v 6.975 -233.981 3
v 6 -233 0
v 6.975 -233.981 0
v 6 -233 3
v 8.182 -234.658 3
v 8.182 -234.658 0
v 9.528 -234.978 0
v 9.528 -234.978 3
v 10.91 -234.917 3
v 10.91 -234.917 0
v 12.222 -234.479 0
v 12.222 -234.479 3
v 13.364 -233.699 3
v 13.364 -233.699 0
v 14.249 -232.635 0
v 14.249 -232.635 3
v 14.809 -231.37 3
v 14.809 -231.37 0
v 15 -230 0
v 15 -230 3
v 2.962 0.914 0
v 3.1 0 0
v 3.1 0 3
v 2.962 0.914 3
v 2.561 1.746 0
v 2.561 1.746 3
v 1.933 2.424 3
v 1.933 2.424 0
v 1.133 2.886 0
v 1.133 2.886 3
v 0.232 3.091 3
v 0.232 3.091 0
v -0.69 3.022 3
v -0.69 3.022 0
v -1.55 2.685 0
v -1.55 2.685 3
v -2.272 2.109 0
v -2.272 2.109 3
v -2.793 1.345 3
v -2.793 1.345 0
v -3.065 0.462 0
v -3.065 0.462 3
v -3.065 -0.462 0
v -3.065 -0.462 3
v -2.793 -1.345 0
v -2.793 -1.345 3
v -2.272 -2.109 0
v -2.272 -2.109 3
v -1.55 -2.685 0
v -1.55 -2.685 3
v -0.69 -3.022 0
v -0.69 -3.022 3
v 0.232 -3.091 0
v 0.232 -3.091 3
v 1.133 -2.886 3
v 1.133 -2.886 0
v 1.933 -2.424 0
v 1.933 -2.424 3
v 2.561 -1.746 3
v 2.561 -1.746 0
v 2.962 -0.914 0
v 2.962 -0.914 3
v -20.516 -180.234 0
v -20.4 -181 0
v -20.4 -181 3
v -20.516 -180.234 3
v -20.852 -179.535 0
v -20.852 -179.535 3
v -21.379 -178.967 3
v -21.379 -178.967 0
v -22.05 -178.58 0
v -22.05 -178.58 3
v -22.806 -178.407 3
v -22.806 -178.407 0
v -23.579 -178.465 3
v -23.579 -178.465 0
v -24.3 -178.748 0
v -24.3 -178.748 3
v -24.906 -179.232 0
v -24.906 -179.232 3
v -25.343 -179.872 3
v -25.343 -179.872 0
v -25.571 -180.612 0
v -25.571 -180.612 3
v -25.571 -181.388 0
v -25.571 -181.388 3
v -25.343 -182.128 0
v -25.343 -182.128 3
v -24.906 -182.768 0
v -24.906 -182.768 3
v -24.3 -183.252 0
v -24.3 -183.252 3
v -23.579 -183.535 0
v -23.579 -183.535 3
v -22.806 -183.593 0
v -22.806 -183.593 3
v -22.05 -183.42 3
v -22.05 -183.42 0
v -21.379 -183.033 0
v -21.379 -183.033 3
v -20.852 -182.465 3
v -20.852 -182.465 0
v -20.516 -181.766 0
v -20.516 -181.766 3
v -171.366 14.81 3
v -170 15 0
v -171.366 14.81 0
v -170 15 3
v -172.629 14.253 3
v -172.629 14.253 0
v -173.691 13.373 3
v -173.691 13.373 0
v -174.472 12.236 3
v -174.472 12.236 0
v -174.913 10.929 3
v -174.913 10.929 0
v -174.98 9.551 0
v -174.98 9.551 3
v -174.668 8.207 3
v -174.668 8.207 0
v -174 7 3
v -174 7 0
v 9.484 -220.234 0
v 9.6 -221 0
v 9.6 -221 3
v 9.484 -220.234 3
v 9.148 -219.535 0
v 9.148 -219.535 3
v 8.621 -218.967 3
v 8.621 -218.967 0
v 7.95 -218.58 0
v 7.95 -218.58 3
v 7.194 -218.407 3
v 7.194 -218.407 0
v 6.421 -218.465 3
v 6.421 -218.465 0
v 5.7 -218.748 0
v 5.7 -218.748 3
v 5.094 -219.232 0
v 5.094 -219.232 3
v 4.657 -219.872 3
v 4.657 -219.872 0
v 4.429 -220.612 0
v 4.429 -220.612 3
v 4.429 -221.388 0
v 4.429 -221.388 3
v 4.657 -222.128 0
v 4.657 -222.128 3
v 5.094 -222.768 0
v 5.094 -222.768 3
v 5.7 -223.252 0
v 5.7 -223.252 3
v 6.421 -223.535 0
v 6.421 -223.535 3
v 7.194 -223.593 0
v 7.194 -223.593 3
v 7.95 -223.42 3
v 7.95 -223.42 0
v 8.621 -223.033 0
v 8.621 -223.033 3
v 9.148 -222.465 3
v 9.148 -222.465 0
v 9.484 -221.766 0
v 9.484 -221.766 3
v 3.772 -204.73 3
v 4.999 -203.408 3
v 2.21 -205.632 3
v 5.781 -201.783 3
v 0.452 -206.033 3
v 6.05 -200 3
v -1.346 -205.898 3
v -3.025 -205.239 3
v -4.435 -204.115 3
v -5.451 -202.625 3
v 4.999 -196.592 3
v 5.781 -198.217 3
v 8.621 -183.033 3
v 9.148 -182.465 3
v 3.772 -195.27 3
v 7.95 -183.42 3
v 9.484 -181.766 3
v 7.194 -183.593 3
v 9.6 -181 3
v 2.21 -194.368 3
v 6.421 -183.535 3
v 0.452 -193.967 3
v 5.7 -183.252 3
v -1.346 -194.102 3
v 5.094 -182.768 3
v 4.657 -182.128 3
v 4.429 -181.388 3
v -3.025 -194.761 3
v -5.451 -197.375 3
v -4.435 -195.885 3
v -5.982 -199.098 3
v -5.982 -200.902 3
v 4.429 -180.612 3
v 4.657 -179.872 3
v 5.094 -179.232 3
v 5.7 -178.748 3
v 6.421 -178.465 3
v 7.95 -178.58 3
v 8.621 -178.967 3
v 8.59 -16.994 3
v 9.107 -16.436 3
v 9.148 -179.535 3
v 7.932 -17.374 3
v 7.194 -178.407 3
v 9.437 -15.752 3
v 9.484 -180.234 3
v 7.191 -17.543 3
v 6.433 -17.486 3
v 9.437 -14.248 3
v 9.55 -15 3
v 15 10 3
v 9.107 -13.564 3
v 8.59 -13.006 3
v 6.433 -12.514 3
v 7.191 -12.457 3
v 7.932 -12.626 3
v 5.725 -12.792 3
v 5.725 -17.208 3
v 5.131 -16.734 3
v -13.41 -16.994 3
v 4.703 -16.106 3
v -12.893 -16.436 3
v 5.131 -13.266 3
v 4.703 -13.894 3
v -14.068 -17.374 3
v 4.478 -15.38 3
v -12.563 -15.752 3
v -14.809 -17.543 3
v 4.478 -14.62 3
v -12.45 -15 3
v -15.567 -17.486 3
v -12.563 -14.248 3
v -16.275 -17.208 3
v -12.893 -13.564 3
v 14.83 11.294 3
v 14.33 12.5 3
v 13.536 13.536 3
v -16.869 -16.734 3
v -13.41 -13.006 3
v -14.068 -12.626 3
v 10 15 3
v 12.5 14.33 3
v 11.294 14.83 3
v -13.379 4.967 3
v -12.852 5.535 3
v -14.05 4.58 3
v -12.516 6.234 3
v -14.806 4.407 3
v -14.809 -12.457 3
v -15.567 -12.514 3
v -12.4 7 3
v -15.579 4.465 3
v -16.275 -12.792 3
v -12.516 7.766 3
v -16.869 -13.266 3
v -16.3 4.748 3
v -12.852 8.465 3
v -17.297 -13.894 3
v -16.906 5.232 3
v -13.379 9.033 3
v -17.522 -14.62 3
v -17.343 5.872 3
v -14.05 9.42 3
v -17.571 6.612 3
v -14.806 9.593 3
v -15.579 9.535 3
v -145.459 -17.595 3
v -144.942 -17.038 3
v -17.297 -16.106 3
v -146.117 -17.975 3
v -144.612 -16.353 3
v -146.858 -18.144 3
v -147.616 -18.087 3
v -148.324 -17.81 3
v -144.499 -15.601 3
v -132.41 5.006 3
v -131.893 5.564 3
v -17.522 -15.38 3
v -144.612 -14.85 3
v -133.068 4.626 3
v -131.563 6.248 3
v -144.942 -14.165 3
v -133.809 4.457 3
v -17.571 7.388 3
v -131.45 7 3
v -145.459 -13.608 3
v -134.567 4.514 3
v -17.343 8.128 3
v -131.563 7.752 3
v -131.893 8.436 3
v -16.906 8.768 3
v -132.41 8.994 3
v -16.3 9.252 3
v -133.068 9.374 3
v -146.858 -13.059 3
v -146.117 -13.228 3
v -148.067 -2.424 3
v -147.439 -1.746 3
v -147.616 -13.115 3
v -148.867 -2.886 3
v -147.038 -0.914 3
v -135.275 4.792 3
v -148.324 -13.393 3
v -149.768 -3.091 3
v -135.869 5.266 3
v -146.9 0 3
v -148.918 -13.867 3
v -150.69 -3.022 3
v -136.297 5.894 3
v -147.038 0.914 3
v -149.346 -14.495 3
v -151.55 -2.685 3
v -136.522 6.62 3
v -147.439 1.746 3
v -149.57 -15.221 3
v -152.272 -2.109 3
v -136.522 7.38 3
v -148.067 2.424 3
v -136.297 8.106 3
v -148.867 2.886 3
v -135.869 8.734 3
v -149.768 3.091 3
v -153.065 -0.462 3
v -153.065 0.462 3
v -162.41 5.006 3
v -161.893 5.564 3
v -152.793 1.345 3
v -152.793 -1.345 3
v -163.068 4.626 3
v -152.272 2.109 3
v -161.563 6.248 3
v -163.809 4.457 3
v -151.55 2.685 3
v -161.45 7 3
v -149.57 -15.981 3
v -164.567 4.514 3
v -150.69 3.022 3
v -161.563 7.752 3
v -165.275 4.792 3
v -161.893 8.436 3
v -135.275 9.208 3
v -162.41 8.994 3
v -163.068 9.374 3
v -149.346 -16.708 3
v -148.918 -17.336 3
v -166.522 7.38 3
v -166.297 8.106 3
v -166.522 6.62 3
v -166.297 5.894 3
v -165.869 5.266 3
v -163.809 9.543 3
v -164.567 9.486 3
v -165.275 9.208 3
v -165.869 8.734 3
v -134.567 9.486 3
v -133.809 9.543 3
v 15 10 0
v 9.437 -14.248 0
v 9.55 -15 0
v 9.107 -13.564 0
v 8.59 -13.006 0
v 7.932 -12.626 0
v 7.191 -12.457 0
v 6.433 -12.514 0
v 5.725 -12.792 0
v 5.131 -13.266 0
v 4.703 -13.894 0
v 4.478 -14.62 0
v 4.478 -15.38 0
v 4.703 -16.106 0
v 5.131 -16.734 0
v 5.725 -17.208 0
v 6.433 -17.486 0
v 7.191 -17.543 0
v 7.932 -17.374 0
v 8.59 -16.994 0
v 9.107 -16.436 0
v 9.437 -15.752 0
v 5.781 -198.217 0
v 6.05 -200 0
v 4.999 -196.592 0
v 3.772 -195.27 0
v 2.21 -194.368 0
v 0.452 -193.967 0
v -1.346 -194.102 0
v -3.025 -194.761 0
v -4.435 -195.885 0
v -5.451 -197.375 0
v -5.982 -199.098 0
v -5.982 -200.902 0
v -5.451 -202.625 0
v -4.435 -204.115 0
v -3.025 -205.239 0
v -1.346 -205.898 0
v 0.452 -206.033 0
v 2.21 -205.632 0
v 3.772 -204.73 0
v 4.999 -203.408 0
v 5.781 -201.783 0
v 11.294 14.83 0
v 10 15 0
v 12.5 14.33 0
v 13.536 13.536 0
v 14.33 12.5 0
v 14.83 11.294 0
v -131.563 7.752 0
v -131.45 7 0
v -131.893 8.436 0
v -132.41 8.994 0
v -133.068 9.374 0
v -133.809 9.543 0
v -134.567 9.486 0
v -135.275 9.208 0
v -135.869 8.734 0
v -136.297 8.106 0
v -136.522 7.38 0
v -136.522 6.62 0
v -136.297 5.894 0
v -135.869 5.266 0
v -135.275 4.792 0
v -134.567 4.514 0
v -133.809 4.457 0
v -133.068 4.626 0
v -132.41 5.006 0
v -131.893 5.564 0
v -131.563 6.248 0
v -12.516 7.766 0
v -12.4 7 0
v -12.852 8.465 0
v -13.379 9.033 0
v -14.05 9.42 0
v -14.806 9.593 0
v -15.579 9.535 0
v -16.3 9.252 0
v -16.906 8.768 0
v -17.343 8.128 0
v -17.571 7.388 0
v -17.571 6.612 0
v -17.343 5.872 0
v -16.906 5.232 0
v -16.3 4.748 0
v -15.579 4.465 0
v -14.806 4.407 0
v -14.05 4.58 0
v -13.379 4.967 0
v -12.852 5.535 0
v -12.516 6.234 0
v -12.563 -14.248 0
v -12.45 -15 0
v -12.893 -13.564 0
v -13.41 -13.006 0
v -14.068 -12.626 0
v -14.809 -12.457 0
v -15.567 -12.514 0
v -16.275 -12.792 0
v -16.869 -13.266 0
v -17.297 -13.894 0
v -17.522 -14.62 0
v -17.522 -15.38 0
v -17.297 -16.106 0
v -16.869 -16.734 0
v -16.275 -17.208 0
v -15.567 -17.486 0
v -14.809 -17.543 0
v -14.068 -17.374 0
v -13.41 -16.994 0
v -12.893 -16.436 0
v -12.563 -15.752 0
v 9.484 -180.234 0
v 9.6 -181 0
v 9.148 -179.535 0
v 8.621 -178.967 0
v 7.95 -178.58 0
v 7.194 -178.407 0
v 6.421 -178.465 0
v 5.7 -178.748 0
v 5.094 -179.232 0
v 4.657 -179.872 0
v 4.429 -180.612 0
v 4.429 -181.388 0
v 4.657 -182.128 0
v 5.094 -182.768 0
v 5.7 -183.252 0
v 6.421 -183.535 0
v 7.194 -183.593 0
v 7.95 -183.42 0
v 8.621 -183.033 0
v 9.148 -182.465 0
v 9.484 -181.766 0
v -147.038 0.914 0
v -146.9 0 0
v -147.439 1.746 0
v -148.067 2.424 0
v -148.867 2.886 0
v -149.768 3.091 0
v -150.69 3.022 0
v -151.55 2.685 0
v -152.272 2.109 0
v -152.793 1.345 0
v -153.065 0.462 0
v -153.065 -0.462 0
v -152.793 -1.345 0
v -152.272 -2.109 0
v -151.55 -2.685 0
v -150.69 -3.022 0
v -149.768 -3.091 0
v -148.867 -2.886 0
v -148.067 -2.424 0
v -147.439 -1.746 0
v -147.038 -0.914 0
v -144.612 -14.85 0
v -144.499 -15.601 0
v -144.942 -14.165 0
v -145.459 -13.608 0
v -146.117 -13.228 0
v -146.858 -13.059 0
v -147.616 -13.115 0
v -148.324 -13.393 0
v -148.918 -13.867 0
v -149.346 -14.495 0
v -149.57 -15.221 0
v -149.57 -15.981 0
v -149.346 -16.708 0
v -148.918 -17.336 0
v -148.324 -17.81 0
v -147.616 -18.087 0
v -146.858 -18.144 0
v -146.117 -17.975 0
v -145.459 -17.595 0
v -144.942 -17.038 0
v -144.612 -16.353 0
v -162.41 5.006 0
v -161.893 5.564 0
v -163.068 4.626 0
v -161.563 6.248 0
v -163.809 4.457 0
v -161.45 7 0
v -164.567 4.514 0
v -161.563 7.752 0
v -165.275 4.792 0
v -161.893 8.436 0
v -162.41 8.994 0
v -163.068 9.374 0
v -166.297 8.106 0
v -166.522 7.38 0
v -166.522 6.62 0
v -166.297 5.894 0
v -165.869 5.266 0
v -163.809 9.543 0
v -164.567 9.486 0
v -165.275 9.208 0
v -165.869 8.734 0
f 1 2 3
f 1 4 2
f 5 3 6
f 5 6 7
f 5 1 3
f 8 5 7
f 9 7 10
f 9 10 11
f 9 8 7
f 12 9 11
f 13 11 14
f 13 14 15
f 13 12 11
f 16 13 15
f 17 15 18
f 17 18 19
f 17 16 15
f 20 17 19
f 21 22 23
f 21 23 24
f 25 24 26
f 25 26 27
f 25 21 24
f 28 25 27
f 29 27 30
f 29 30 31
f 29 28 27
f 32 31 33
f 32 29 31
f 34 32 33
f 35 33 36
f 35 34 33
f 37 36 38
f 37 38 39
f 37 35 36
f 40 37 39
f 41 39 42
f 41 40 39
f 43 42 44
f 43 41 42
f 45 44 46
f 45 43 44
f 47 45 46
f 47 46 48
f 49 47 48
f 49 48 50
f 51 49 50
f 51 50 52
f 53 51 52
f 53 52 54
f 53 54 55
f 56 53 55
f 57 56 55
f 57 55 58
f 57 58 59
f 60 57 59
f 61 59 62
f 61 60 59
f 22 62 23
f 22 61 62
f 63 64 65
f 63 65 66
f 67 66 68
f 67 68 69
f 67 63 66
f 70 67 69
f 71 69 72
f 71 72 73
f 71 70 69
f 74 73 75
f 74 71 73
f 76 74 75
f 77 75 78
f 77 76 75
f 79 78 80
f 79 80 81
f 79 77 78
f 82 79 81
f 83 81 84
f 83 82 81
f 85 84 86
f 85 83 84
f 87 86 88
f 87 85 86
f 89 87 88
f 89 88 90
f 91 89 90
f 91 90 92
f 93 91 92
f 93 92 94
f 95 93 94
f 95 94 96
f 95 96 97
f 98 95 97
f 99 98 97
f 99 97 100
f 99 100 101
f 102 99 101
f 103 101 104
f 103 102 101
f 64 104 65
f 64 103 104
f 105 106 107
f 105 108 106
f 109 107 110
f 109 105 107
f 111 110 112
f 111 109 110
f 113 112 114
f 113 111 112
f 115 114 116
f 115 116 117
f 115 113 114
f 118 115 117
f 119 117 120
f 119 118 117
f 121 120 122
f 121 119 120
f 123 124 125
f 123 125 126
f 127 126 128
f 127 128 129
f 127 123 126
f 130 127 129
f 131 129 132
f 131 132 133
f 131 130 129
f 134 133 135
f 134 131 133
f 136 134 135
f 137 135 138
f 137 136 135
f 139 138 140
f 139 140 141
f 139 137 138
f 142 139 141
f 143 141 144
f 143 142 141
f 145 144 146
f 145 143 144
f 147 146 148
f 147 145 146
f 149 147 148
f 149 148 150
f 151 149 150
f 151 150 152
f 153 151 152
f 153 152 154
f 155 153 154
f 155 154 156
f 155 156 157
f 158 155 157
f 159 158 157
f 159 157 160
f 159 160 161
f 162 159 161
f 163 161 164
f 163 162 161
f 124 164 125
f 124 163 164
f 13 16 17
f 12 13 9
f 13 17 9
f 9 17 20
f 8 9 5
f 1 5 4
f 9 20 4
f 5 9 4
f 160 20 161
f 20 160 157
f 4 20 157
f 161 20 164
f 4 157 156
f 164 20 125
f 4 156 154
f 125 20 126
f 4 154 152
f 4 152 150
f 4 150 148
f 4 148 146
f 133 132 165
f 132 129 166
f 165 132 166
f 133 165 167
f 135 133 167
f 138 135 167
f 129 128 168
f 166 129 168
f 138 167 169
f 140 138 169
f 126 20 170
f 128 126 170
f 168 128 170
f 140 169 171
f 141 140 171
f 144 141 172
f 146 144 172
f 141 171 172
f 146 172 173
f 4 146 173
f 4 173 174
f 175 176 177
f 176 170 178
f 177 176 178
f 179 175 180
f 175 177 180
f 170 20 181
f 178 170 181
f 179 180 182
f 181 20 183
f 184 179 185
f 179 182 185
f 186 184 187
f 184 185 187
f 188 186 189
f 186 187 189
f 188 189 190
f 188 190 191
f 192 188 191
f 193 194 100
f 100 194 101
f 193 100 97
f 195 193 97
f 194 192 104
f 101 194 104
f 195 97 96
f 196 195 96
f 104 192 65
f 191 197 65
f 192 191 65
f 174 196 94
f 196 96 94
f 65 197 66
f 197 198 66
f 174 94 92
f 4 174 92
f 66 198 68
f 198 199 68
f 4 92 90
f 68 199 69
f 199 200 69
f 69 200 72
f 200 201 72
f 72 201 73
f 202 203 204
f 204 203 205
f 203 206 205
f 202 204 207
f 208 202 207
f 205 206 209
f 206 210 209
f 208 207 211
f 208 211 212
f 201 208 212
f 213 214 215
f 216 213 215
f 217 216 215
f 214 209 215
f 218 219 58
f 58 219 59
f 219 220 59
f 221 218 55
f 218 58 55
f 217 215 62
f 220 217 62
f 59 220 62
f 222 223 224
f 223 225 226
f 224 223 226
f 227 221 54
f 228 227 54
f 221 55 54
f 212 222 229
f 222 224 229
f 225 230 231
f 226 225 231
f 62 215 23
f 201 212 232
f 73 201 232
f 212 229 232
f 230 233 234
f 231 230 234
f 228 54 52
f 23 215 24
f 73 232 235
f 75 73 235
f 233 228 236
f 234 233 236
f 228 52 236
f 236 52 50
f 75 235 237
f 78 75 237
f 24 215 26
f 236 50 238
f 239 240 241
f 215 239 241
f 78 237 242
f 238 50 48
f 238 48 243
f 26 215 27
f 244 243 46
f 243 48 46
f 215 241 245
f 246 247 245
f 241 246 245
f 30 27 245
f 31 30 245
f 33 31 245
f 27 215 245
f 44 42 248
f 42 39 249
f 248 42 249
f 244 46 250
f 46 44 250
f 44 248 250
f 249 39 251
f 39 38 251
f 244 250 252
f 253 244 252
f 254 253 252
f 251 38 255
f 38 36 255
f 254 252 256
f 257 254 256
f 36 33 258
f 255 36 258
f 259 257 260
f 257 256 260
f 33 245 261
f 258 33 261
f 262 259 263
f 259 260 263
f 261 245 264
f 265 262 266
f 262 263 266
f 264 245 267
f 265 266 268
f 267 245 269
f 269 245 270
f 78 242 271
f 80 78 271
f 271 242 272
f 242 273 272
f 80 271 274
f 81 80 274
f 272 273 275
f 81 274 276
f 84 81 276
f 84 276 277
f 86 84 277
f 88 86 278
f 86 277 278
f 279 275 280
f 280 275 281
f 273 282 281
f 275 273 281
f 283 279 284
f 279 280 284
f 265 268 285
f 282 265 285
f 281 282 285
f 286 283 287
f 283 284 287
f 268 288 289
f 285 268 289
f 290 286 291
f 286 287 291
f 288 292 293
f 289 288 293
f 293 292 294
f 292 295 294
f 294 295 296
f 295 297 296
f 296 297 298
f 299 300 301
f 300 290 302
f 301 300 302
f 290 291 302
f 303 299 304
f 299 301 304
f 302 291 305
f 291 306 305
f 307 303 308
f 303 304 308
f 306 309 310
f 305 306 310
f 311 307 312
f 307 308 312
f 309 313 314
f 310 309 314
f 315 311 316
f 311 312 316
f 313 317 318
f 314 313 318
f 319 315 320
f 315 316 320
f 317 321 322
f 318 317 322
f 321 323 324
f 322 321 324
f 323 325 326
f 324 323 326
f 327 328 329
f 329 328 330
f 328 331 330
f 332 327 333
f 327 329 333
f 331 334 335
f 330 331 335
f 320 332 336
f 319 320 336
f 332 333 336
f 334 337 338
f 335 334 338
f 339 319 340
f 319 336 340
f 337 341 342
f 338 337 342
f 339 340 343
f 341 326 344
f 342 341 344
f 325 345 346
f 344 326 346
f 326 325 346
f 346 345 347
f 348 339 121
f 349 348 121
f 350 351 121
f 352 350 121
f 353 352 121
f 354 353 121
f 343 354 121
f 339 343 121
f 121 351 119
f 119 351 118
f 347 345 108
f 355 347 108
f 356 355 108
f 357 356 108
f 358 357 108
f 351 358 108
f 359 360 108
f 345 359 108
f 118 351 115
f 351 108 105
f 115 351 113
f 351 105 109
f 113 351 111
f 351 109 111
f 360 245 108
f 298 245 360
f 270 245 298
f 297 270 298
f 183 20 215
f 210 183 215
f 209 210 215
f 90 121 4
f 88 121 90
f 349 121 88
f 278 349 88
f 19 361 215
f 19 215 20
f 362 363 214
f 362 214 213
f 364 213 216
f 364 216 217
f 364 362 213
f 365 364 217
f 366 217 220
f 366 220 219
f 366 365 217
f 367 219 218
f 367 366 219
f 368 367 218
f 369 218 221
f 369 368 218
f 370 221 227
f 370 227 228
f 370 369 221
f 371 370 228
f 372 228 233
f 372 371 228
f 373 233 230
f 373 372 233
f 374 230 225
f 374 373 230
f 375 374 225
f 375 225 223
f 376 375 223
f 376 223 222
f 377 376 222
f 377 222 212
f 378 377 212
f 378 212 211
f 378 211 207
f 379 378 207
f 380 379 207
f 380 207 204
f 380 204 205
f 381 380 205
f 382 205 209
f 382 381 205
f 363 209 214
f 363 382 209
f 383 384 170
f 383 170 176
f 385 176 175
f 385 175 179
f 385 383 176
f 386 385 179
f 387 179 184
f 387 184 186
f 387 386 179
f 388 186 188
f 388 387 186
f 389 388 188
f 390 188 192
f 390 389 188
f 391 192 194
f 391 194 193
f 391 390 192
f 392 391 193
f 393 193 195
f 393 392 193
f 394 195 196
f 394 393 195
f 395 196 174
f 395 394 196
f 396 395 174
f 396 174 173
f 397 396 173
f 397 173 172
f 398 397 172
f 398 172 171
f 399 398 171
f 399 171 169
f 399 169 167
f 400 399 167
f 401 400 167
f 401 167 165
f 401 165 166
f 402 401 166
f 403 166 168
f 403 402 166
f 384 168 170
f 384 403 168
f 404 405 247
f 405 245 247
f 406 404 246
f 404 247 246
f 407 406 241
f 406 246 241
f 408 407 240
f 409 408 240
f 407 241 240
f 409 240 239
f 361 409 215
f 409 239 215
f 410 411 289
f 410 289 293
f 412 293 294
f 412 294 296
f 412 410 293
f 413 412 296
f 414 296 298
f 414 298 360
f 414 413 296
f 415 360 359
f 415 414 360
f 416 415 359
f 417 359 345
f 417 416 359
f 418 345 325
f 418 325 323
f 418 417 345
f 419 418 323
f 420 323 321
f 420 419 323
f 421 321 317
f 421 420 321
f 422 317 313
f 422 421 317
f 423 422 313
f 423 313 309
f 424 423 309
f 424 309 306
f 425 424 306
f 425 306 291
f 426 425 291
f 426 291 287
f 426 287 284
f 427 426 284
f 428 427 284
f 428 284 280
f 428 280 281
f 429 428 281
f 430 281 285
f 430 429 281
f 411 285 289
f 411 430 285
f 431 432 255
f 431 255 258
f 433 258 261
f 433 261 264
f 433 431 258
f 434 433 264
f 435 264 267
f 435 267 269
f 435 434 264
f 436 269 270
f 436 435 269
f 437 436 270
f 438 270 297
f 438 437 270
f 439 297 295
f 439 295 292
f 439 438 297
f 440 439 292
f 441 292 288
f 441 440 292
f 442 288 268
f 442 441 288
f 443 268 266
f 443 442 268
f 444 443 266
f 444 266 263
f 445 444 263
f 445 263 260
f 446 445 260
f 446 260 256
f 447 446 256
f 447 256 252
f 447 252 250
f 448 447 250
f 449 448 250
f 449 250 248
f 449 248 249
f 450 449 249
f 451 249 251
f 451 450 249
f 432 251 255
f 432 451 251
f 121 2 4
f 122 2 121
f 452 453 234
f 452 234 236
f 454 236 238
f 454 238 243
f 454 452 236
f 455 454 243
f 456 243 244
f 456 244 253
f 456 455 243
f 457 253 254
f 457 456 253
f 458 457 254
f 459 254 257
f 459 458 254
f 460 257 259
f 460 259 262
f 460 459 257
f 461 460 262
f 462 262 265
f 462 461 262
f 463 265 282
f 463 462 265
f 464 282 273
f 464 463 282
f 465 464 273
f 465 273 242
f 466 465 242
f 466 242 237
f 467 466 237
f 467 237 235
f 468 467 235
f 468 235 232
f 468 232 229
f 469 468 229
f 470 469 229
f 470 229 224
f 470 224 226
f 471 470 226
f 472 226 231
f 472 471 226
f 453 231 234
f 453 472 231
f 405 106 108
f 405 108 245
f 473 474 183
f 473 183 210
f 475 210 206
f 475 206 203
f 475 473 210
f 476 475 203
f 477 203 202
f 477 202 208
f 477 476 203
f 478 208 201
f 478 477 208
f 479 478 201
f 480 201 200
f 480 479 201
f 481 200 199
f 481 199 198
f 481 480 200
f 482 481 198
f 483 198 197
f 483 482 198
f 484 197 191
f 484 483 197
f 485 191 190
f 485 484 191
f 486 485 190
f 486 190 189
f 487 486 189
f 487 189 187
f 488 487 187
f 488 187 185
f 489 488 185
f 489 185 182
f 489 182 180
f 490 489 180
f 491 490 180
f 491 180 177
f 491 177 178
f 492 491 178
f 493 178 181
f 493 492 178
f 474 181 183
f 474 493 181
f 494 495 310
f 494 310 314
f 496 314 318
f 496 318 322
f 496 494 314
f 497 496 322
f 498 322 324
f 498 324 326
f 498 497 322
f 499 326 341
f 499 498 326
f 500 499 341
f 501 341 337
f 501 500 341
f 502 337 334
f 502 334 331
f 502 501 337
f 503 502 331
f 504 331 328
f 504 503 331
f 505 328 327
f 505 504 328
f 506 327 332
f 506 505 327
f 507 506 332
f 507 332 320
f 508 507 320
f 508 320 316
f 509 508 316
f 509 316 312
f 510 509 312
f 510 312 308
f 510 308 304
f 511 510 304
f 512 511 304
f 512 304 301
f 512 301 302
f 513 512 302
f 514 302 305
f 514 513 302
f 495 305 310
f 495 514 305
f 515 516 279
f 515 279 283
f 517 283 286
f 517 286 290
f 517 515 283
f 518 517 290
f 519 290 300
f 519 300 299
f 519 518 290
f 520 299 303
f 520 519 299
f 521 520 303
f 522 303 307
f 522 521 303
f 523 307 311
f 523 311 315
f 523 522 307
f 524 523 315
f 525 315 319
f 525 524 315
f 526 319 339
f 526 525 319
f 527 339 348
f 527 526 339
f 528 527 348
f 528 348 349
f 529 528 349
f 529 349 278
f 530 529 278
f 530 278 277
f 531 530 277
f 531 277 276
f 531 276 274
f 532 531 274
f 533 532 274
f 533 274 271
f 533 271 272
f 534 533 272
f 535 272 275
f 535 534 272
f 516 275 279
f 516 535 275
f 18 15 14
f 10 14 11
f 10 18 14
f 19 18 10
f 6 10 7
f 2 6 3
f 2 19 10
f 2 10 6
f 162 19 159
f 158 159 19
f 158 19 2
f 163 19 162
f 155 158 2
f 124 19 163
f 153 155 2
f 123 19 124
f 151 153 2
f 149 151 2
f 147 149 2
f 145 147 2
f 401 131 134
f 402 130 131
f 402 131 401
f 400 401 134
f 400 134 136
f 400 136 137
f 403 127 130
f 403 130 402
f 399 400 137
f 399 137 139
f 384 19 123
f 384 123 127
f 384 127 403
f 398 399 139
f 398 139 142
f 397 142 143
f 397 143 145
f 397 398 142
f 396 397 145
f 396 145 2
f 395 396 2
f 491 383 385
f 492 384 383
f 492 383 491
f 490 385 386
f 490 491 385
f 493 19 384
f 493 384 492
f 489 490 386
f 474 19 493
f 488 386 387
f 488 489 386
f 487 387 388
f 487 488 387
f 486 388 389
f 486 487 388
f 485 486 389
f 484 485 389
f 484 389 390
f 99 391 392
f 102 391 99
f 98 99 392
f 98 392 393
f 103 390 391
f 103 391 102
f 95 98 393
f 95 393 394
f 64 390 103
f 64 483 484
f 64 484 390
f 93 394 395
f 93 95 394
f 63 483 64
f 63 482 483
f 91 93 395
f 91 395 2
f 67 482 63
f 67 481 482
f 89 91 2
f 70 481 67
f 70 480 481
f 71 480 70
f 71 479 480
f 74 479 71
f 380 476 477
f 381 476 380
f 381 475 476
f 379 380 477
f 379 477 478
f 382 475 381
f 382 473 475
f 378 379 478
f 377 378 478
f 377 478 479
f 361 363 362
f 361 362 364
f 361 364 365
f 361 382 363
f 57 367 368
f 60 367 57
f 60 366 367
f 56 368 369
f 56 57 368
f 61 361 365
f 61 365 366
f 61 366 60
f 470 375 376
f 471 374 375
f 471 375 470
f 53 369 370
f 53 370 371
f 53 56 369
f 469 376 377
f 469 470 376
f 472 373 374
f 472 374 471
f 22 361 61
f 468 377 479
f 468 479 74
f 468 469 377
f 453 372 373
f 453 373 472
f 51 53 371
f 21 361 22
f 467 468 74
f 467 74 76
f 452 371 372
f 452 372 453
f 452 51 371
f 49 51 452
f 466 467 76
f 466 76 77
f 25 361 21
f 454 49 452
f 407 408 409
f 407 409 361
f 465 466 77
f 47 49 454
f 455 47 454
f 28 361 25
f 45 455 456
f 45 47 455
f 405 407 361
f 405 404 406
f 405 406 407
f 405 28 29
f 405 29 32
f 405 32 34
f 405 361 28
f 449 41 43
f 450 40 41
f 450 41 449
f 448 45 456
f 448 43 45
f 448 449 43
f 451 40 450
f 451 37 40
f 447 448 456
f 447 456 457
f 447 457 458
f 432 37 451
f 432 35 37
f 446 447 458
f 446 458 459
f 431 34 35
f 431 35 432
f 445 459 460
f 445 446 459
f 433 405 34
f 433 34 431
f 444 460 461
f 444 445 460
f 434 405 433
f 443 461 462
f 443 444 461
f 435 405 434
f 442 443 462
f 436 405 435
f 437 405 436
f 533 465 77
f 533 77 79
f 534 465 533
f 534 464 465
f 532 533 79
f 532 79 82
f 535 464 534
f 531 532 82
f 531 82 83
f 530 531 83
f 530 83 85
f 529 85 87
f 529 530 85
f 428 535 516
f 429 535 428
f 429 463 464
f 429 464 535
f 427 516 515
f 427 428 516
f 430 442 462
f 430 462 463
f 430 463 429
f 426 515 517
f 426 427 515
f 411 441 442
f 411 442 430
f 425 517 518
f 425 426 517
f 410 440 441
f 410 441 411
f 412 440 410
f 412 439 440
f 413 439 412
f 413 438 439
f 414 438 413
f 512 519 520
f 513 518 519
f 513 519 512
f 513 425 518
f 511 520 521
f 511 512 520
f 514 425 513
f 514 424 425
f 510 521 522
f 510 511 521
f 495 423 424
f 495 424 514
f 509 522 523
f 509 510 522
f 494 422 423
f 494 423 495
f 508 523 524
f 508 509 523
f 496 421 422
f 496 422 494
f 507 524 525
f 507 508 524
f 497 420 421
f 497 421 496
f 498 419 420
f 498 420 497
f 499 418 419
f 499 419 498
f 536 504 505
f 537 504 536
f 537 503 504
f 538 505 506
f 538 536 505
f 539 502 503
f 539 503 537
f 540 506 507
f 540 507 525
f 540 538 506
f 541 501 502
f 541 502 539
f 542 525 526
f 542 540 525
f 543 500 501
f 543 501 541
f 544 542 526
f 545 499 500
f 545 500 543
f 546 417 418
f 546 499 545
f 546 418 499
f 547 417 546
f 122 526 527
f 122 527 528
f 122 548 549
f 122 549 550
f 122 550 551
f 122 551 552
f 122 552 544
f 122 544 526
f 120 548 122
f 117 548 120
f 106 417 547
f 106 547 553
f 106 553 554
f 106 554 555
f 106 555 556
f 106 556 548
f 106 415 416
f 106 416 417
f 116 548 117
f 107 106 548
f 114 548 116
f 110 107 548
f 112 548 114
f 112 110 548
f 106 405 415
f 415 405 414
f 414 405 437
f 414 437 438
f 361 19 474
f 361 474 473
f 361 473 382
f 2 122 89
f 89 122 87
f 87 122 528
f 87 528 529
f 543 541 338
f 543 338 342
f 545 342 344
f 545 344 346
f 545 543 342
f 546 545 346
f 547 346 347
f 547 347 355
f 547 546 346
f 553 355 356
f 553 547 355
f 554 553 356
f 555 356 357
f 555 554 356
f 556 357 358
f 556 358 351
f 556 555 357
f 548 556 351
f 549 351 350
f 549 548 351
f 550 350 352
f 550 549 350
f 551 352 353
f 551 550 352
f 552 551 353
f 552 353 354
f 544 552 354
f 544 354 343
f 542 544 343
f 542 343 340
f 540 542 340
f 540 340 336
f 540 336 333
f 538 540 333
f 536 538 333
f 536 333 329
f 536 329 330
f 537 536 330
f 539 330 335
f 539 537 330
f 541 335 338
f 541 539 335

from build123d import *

# Parameters (mm, degrees)
SKETCH_2_R      = 3.1
SKETCH_2_R_2    = 6.05
SKETCH_2_R_3    = 2.55
SKETCH_2_R_4    = 2.6
EXTRUDE_1_DEPTH = 3
FILLET_1_R      = 5


with BuildPart() as part:
    # 草图2 → 凸台-拉伸1 (new body)
    with BuildSketch(Plane.XY):
        Polygon((-180, 15), (15, 15), (15, -245), align=None)
        Circle(SKETCH_2_R, mode=Mode.SUBTRACT)
        with Locations((-150, 0)):
            Circle(SKETCH_2_R, mode=Mode.SUBTRACT)
        with Locations((0, -200)):
            Circle(SKETCH_2_R_2, mode=Mode.SUBTRACT)
        with Locations((-164, 7)):
            Circle(SKETCH_2_R_3, mode=Mode.SUBTRACT)
        with Locations((-134, 7)):
            Circle(SKETCH_2_R_3, mode=Mode.SUBTRACT)
        with Locations((-147.04893552, -15.601419306)):
            Circle(SKETCH_2_R_3, mode=Mode.SUBTRACT)
        with Locations((-15, 7)):
            Circle(SKETCH_2_R_4, mode=Mode.SUBTRACT)
        with Locations((7, -15)):
            Circle(SKETCH_2_R_3, mode=Mode.SUBTRACT)
        with Locations((7, -221)):
            Circle(SKETCH_2_R_4, mode=Mode.SUBTRACT)
        with Locations((-23, -181)):
            Circle(SKETCH_2_R_4, mode=Mode.SUBTRACT)
        with Locations((7, -181)):
            Circle(SKETCH_2_R_4, mode=Mode.SUBTRACT)
        with Locations((-15, -15)):
            Circle(SKETCH_2_R_3, mode=Mode.SUBTRACT)
    extrude(amount=EXTRUDE_1_DEPTH)

    # 圆角1
    fillet_1_edges = [part.edges().sort_by_distance(p)[0] for p in [
        (-180, 15, 1.5),
        (15, 15, 1.5),
        (15, -245, 1.5),
    ]]
    fillet(fillet_1_edges, radius=FILLET_1_R)


solid = part.part
